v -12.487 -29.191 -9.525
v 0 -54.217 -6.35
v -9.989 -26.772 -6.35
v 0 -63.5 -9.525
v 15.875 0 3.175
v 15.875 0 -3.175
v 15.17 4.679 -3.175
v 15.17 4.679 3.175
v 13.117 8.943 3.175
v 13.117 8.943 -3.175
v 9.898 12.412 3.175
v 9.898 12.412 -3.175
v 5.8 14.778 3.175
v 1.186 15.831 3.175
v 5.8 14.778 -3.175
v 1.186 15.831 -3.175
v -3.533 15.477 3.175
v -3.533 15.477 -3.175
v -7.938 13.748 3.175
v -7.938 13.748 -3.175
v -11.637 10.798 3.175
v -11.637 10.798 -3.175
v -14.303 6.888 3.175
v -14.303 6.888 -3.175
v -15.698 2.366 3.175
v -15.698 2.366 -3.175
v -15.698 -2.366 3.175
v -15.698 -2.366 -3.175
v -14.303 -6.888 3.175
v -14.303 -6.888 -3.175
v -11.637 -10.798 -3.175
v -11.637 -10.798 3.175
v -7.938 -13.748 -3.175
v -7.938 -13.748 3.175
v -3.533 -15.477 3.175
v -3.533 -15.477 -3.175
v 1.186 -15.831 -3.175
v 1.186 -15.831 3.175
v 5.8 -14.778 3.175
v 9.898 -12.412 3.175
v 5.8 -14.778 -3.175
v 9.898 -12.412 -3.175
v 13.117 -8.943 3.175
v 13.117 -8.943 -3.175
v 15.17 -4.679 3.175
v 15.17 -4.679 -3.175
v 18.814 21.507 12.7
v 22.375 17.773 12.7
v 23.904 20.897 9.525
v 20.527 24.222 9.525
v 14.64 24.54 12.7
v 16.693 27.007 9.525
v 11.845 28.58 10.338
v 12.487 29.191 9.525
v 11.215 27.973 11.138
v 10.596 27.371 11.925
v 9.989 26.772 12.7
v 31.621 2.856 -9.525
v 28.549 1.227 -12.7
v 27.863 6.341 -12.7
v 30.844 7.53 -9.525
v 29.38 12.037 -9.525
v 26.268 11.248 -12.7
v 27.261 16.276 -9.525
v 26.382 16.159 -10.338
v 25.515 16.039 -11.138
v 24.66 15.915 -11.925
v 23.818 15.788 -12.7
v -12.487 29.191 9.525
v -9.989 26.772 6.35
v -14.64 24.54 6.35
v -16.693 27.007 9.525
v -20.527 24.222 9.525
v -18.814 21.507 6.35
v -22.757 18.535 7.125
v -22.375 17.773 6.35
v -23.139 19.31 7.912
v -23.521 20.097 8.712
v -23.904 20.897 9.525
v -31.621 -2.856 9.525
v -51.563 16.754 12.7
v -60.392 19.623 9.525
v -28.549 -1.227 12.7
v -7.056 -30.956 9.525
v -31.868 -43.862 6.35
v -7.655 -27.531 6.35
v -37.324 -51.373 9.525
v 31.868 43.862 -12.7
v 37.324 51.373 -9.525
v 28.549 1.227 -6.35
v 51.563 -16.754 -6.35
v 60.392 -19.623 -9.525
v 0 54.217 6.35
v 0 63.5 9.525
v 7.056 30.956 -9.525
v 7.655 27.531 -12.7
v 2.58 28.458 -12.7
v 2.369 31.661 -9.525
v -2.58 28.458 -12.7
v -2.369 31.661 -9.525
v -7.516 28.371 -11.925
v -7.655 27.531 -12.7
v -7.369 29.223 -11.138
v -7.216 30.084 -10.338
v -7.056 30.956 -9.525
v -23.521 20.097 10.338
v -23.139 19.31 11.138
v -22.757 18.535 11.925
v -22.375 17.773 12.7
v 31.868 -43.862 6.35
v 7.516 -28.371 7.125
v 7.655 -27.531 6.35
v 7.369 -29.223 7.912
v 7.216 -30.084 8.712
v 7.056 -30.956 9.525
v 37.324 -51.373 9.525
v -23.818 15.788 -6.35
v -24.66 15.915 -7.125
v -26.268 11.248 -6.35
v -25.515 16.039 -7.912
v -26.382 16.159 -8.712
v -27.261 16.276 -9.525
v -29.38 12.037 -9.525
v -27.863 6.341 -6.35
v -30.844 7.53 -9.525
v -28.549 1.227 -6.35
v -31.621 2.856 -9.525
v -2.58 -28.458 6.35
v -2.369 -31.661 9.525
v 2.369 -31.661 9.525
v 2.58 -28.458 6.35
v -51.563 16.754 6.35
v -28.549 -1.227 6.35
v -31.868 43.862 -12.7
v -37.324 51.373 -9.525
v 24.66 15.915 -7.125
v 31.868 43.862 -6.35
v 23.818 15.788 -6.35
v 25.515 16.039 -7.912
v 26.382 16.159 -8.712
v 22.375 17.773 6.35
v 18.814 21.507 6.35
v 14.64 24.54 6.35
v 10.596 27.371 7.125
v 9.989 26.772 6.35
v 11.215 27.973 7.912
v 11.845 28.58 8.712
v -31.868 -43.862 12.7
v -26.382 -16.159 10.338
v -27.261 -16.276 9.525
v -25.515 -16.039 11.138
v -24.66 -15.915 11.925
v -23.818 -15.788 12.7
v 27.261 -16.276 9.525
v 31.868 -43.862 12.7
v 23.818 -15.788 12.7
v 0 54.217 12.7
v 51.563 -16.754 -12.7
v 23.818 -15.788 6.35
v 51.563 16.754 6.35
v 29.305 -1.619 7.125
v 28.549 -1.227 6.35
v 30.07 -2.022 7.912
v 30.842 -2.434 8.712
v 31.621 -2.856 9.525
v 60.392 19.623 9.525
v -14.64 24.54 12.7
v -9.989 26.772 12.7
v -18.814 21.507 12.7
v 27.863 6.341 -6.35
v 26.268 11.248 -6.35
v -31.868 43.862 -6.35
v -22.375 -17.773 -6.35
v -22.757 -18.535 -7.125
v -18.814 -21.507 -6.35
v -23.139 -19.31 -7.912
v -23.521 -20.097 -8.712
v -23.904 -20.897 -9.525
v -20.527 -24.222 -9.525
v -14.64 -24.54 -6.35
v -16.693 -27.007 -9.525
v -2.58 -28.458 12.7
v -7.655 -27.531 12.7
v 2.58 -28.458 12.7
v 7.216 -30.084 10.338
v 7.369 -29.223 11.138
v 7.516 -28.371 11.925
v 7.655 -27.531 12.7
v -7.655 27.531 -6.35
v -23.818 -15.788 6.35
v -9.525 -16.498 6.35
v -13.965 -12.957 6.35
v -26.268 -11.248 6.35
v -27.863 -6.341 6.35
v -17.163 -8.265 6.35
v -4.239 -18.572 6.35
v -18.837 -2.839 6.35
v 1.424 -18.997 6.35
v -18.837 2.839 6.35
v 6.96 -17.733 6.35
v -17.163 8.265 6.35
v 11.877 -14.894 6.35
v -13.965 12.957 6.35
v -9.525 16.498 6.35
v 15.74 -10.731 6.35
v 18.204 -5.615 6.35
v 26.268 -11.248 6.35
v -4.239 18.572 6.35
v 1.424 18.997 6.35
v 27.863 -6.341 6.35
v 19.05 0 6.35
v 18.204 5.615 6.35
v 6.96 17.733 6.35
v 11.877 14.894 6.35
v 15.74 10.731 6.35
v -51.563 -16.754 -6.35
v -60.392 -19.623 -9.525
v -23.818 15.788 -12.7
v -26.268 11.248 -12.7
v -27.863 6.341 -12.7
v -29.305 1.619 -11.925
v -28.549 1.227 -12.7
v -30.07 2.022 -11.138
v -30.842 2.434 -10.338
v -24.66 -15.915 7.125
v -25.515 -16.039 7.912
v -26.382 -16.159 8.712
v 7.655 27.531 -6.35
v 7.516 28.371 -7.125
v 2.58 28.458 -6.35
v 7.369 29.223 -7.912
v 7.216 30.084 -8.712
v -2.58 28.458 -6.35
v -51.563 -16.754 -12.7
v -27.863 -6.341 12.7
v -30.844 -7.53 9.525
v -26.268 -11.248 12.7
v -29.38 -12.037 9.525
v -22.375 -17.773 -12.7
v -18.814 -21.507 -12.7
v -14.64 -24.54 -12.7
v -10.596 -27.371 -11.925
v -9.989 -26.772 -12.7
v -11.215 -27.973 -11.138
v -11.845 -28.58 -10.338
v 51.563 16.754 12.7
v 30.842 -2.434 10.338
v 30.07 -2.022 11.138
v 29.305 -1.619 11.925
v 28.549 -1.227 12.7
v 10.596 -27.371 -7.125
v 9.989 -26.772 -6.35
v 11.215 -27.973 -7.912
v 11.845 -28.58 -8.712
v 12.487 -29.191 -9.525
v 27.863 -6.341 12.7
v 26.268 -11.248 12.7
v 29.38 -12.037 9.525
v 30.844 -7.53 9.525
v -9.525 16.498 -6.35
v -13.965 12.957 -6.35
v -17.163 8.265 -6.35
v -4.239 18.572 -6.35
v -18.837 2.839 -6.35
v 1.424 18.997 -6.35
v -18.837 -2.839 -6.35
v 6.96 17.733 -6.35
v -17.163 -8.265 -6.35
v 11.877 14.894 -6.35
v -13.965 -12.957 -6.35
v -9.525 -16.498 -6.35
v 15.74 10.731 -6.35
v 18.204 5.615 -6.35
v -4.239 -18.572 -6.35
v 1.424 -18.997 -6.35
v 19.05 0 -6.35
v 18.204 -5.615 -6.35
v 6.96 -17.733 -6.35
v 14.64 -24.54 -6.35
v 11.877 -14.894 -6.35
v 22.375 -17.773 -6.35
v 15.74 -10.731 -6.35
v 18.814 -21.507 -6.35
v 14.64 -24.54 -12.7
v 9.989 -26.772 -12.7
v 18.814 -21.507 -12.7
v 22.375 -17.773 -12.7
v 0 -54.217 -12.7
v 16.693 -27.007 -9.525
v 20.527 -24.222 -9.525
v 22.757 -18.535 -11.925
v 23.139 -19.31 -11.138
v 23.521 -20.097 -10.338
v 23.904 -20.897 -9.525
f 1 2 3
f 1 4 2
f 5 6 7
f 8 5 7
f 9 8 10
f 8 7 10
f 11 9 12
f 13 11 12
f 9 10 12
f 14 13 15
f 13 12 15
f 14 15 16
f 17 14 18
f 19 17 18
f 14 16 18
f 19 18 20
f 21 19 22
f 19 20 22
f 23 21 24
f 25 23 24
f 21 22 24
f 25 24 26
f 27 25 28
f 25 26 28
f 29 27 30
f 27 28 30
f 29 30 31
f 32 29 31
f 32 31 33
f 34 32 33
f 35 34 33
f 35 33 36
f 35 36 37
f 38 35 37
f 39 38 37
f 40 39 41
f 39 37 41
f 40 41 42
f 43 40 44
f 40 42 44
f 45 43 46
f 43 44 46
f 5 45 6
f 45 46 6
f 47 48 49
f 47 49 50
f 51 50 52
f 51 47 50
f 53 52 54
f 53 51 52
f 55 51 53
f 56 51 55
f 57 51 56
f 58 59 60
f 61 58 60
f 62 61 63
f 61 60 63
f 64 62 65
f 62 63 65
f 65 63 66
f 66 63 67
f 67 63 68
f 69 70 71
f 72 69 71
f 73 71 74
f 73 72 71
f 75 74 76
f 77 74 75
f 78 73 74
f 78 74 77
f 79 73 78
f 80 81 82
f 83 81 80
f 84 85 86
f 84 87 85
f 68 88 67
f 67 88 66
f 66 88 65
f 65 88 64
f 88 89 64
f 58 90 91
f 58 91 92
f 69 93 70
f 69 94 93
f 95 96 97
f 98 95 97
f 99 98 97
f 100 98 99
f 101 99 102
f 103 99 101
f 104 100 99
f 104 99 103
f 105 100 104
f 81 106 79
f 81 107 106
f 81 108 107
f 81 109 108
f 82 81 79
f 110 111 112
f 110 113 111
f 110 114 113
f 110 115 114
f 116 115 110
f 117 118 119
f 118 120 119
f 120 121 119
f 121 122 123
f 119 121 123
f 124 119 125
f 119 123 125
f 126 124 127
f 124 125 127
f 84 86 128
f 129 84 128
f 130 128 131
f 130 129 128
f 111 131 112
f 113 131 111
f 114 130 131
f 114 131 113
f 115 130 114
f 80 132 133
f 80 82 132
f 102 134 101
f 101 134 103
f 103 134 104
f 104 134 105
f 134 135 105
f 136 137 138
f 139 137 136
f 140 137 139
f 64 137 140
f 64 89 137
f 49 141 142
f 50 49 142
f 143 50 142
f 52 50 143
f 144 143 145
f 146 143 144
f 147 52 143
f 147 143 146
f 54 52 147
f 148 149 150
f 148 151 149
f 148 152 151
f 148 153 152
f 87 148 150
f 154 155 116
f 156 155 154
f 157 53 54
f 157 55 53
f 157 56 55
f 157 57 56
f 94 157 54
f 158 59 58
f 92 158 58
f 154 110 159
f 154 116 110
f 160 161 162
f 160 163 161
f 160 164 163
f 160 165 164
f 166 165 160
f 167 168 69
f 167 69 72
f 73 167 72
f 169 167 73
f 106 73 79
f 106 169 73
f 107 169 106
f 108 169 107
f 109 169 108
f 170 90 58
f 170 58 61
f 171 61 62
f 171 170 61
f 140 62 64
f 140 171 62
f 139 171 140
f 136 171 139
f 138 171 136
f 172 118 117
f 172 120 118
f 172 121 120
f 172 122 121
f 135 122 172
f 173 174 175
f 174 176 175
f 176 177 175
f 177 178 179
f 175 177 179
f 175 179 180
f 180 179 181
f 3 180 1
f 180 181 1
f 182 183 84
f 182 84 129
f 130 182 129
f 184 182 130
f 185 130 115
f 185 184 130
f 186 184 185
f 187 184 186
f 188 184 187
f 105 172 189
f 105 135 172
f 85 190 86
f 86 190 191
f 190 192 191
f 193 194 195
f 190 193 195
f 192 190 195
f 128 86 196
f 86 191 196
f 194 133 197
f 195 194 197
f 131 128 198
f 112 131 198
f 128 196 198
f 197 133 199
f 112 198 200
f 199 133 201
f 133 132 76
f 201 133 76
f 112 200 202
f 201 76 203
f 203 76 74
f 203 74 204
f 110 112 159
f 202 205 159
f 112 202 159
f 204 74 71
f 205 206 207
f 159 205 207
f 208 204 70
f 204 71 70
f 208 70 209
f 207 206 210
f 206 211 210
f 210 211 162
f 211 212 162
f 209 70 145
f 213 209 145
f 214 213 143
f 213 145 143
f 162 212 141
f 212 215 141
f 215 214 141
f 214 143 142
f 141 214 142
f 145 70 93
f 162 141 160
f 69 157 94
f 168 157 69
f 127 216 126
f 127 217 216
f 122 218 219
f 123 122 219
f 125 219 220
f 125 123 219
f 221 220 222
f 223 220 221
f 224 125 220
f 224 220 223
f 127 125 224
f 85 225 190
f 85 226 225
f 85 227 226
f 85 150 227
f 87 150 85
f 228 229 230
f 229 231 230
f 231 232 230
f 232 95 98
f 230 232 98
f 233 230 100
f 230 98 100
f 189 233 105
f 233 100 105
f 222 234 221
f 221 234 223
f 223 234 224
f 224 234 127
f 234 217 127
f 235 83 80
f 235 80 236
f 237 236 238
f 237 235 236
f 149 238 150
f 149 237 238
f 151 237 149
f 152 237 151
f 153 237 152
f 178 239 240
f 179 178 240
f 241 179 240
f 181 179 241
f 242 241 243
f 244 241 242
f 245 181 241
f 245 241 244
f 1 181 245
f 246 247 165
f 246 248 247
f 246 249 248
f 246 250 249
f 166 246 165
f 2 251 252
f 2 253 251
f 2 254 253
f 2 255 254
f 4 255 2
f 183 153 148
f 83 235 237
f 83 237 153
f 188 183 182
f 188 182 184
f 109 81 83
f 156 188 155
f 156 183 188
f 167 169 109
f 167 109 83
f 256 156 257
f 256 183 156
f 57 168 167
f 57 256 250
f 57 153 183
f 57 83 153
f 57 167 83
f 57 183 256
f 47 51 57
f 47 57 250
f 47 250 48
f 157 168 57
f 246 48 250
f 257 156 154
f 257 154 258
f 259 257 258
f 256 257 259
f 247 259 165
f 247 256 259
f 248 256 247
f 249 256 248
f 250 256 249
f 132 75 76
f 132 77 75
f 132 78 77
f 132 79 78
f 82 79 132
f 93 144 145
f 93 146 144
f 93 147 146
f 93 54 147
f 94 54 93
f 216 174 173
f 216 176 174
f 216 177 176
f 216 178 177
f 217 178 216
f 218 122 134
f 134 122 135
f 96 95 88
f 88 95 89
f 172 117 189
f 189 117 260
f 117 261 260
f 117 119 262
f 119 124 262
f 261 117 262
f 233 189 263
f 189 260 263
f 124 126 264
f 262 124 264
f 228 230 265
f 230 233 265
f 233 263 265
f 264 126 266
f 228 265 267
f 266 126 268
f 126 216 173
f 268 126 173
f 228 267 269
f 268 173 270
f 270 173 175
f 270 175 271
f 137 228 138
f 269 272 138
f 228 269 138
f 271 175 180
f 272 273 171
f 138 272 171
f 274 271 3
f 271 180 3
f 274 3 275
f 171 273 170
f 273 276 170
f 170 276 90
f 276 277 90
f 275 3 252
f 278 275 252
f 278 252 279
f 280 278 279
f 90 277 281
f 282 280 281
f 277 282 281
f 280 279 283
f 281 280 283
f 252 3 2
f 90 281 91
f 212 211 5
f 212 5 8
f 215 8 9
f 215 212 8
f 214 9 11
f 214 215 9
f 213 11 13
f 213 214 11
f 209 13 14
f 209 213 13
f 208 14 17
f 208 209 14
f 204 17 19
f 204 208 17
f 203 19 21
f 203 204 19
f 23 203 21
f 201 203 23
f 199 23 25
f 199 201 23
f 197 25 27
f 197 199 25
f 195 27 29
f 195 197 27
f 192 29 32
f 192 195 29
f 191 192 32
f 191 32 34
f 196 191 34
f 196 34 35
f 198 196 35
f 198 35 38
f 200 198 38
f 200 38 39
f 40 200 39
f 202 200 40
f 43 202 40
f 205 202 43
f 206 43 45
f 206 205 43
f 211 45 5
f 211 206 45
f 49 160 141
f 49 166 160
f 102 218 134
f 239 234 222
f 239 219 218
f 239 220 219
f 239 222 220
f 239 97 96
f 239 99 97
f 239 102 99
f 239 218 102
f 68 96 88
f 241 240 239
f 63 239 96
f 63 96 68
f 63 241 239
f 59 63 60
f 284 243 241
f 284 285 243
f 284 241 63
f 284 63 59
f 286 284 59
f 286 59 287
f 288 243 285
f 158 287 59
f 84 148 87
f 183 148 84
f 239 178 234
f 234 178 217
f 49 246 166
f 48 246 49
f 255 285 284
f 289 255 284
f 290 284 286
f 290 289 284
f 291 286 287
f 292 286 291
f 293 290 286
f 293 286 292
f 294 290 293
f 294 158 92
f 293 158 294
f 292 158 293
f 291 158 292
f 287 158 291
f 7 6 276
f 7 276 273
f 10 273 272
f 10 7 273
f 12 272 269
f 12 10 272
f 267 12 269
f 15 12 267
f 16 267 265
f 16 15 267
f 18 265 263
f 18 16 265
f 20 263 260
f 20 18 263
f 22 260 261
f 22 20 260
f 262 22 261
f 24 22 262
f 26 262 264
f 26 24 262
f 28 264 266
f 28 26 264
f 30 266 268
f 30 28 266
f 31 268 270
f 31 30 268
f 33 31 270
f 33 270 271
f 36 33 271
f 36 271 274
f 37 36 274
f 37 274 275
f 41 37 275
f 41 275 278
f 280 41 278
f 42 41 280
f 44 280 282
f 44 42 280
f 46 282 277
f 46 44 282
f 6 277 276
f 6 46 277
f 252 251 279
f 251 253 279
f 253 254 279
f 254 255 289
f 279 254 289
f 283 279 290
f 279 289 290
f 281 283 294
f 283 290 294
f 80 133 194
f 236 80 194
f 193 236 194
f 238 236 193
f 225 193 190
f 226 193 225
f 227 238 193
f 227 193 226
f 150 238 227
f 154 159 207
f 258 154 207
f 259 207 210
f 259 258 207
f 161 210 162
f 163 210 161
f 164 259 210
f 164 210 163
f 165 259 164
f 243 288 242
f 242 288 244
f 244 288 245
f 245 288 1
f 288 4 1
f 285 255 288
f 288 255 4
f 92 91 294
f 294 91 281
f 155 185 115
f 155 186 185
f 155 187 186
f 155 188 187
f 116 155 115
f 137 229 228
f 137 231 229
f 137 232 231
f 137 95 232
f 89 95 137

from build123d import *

# Parameters (mm, degrees)
F0_R     = 31.75
F1_DEPTH = 12.7
F5_DEPTH = 6.35
F7_DEPTH = 6.35
F8_SIZE  = 3.17499


# Not quite as in the source:
# - a fillet or chamfer is up to 0.001 mm smaller than in the source, because OpenCascade refuses the exact size


with BuildPart() as f1:
    # F0 (on Top) → F1 (new body, symmetric)
    with BuildSketch(Plane.XY):
        Circle(F0_R)
    extrude(amount=F1_DEPTH, both=True)

    # F2 (on Front) → F3 (revolve, cut)
    with BuildSketch(Plane.XZ):
        Polygon((31.75, 6.35), (15.875, 6.35), (15.875, -6.35), (31.75, -6.35), (33.2811660987, -6.35), (33.2811660987, 6.35), align=None)
    revolve(axis=Axis((0, 0, 3.175), (0, 0, 1)), mode=Mode.SUBTRACT)

    # F4 (on face) → F5 (join)
    with BuildSketch(Plane.XY.offset(12.7)):
        with BuildLine():
            ThreePointArc((0, 31.75), (6.3734153916, 31.1037309056), (12.487369908, 29.1912331494))
            Line((12.487369908, 29.1912331494), (0, 63.5))
            Line((0, 63.5), (0, 31.75))
        make_face()
        with BuildLine():
            ThreePointArc((-12.487369908, 29.1912331494), (-6.3734153916, 31.1037309056), (0, 31.75))
            Line((0, 31.75), (0, 63.5))
            Line((0, 63.5), (-12.487369908, 29.1912331494))
        make_face()
        with BuildLine():
            ThreePointArc((-31.621322022, -2.8556073925), (-30.1960443924, 9.8112895714), (-23.9037029888, 20.8967816523))
            Line((-23.9037029888, 20.8967816523), (-60.3920887847, 19.6225791428))
            Line((-60.3920887847, 19.6225791428), (-31.621322022, -2.8556073925))
        make_face()
        with BuildLine():
            Line((-37.3243635206, -51.3725791428), (-7.0556818708, -30.9560955764))
            ThreePointArc((-7.0556818708, -30.9560955764), (-18.6621817603, -25.6862895714), (-27.2606708121, -16.2763118327))
            Line((-27.2606708121, -16.2763118327), (-37.3243635206, -51.3725791428))
        make_face()
        with BuildLine():
            Line((37.3243635206, -51.3725791428), (27.2606708121, -16.2763118327))
            ThreePointArc((27.2606708121, -16.2763118327), (18.6621817603, -25.6862895714), (7.0556818708, -30.9560955764))
            Line((7.0556818708, -30.9560955764), (37.3243635206, -51.3725791428))
        make_face()
        with BuildLine():
            ThreePointArc((23.9037029888, 20.8967816523), (29.7237705372, 11.160643577), (31.75, 0))
            ThreePointArc((31.75, 0), (31.7178141917, -1.4292525671), (31.621322022, -2.8556073925))
            Line((31.621322022, -2.8556073925), (60.3920887847, 19.6225791428))
            Line((60.3920887847, 19.6225791428), (23.9037029888, 20.8967816523))
        make_face()
    extrude(amount=-F5_DEPTH)

    # F6 (on face) → F7 (join)
    with BuildSketch(Plane(origin=(0, 0, -12.7), x_dir=(1, 0, 0), z_dir=(0, 0, -1))):
        with BuildLine():
            ThreePointArc((-12.487369908, 29.1912331494), (-6.3734153916, 31.1037309056), (0, 31.75))
            Line((0, 31.75), (0, 63.5))
            Line((0, 63.5), (-12.487369908, 29.1912331494))
        make_face()
        with BuildLine():
            ThreePointArc((0, 31.75), (6.3734153916, 31.1037309056), (12.487369908, 29.1912331494))
            Line((12.487369908, 29.1912331494), (0, 63.5))
            Line((0, 63.5), (0, 31.75))
        make_face()
        with BuildLine():
            ThreePointArc((-31.621322022, -2.8556073925), (-30.1960443924, 9.8112895714), (-23.9037029888, 20.8967816523))
            Line((-23.9037029888, 20.8967816523), (-60.3920887847, 19.6225791428))
            Line((-60.3920887847, 19.6225791428), (-31.621322022, -2.8556073925))
        make_face()
        with BuildLine():
            ThreePointArc((23.9037029888, 20.8967816523), (29.7237705372, 11.160643577), (31.75, 0))
            ThreePointArc((31.75, 0), (31.7178141917, -1.4292525671), (31.621322022, -2.8556073925))
            Line((31.621322022, -2.8556073925), (60.3920887847, 19.6225791428))
            Line((60.3920887847, 19.6225791428), (23.9037029888, 20.8967816523))
        make_face()
        with BuildLine():
            Line((-37.3243635206, -51.3725791428), (-7.0556818708, -30.9560955764))
            ThreePointArc((-7.0556818708, -30.9560955764), (-18.6621817603, -25.6862895714), (-27.2606708121, -16.2763118327))
            Line((-27.2606708121, -16.2763118327), (-37.3243635206, -51.3725791428))
        make_face()
        with BuildLine():
            Line((37.3243635206, -51.3725791428), (27.2606708121, -16.2763118327))
            ThreePointArc((27.2606708121, -16.2763118327), (18.6621817603, -25.6862895714), (7.0556818708, -30.9560955764))
            Line((7.0556818708, -30.9560955764), (37.3243635206, -51.3725791428))
        make_face()
    extrude(amount=-F7_DEPTH)

    # F8 (size 3.175 in the source; OpenCascade refuses exactly that, so slightly less here)
    f8_edges = [f1.edges().sort_by_distance(p)[0] for p in [
        (18.662182, 25.68629, 12.7),
        (6.243685, 46.345617, 12.7),
        (-6.243685, 46.345617, 12.7),
        (-18.662182, 25.68629, 12.7),
        (-42.147896, 20.25968, 12.7),
        (-46.006705, 8.383486, 12.7),
        (-30.196044, -9.81129, 12.7),
        (-32.292517, -33.824445, 12.7),
        (-22.190023, -41.164337, 12.7),
        (0, -31.75, 12.7),
        (22.190023, -41.164337, 12.7),
        (32.292517, -33.824445, 12.7),
        (30.196044, -9.81129, 12.7),
        (46.006705, 8.383486, 12.7),
        (42.147896, 20.25968, 12.7),
        (30.196044, 9.81129, -6.35),
        (46.006705, -8.383486, -6.35),
        (42.147896, -20.25968, -6.35),
        (18.662182, -25.68629, -6.35),
        (6.243685, -46.345617, -6.35),
        (-6.243685, -46.345617, -6.35),
        (-18.662182, -25.68629, -6.35),
        (-42.147896, -20.25968, -6.35),
        (-46.006705, -8.383486, -6.35),
        (-30.196044, 9.81129, -6.35),
        (-32.292517, 33.824445, -6.35),
        (-22.190023, 41.164337, -6.35),
        (0, 31.75, -6.35),
        (22.190023, 41.164337, -6.35),
        (32.292517, 33.824445, -6.35),
        (-15.875, 0, -6.35),
        (18.662182, 25.68629, 6.35),
        (6.243685, 46.345617, 6.35),
        (-6.243685, 46.345617, 6.35),
        (-18.662182, 25.68629, 6.35),
        (-42.147896, 20.25968, 6.35),
        (-46.006705, 8.383486, 6.35),
        (-30.196044, -9.81129, 6.35),
        (-32.292517, -33.824445, 6.35),
        (-22.190023, -41.164337, 6.35),
        (0, -31.75, 6.35),
        (22.190023, -41.164337, 6.35),
        (32.292517, -33.824445, 6.35),
        (30.196044, -9.81129, 6.35),
        (46.006705, 8.383486, 6.35),
        (42.147896, 20.25968, 6.35),
        (-15.875, 0, 6.35),
        (30.196044, 9.81129, -12.7),
        (32.292517, 33.824445, -12.7),
        (22.190023, 41.164337, -12.7),
        (0, 31.75, -12.7),
        (-22.190023, 41.164337, -12.7),
        (-32.292517, 33.824445, -12.7),
        (-30.196044, 9.81129, -12.7),
        (-46.006705, -8.383486, -12.7),
        (-42.147896, -20.25968, -12.7),
        (-18.662182, -25.68629, -12.7),
        (-6.243685, -46.345617, -12.7),
        (6.243685, -46.345617, -12.7),
        (18.662182, -25.68629, -12.7),
        (42.147896, -20.25968, -12.7),
        (46.006705, -8.383486, -12.7),
    ]]
    chamfer(f8_edges, length=F8_SIZE)


solid = f1.part
